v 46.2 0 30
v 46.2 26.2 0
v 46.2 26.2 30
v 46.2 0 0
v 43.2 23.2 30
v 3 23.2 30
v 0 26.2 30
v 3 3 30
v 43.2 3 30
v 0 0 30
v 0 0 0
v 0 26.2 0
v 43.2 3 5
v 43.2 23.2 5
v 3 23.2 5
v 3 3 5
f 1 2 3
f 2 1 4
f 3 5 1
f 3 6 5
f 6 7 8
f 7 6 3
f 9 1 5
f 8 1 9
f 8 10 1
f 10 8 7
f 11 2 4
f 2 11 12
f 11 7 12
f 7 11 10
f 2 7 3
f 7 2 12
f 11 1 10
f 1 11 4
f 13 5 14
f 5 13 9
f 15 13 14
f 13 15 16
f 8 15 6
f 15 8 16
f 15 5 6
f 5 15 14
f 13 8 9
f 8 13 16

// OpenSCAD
module rolfsDing (height, width, depth, wall) {
    difference() {
        cube([width+wall*2, depth+wall*2, height]);
        
        translate([wall, wall, 5])
        cube([width, depth, height]);
    }
}

rolfsDing(height=30, width=40.2, depth=20.2, wall=3);
